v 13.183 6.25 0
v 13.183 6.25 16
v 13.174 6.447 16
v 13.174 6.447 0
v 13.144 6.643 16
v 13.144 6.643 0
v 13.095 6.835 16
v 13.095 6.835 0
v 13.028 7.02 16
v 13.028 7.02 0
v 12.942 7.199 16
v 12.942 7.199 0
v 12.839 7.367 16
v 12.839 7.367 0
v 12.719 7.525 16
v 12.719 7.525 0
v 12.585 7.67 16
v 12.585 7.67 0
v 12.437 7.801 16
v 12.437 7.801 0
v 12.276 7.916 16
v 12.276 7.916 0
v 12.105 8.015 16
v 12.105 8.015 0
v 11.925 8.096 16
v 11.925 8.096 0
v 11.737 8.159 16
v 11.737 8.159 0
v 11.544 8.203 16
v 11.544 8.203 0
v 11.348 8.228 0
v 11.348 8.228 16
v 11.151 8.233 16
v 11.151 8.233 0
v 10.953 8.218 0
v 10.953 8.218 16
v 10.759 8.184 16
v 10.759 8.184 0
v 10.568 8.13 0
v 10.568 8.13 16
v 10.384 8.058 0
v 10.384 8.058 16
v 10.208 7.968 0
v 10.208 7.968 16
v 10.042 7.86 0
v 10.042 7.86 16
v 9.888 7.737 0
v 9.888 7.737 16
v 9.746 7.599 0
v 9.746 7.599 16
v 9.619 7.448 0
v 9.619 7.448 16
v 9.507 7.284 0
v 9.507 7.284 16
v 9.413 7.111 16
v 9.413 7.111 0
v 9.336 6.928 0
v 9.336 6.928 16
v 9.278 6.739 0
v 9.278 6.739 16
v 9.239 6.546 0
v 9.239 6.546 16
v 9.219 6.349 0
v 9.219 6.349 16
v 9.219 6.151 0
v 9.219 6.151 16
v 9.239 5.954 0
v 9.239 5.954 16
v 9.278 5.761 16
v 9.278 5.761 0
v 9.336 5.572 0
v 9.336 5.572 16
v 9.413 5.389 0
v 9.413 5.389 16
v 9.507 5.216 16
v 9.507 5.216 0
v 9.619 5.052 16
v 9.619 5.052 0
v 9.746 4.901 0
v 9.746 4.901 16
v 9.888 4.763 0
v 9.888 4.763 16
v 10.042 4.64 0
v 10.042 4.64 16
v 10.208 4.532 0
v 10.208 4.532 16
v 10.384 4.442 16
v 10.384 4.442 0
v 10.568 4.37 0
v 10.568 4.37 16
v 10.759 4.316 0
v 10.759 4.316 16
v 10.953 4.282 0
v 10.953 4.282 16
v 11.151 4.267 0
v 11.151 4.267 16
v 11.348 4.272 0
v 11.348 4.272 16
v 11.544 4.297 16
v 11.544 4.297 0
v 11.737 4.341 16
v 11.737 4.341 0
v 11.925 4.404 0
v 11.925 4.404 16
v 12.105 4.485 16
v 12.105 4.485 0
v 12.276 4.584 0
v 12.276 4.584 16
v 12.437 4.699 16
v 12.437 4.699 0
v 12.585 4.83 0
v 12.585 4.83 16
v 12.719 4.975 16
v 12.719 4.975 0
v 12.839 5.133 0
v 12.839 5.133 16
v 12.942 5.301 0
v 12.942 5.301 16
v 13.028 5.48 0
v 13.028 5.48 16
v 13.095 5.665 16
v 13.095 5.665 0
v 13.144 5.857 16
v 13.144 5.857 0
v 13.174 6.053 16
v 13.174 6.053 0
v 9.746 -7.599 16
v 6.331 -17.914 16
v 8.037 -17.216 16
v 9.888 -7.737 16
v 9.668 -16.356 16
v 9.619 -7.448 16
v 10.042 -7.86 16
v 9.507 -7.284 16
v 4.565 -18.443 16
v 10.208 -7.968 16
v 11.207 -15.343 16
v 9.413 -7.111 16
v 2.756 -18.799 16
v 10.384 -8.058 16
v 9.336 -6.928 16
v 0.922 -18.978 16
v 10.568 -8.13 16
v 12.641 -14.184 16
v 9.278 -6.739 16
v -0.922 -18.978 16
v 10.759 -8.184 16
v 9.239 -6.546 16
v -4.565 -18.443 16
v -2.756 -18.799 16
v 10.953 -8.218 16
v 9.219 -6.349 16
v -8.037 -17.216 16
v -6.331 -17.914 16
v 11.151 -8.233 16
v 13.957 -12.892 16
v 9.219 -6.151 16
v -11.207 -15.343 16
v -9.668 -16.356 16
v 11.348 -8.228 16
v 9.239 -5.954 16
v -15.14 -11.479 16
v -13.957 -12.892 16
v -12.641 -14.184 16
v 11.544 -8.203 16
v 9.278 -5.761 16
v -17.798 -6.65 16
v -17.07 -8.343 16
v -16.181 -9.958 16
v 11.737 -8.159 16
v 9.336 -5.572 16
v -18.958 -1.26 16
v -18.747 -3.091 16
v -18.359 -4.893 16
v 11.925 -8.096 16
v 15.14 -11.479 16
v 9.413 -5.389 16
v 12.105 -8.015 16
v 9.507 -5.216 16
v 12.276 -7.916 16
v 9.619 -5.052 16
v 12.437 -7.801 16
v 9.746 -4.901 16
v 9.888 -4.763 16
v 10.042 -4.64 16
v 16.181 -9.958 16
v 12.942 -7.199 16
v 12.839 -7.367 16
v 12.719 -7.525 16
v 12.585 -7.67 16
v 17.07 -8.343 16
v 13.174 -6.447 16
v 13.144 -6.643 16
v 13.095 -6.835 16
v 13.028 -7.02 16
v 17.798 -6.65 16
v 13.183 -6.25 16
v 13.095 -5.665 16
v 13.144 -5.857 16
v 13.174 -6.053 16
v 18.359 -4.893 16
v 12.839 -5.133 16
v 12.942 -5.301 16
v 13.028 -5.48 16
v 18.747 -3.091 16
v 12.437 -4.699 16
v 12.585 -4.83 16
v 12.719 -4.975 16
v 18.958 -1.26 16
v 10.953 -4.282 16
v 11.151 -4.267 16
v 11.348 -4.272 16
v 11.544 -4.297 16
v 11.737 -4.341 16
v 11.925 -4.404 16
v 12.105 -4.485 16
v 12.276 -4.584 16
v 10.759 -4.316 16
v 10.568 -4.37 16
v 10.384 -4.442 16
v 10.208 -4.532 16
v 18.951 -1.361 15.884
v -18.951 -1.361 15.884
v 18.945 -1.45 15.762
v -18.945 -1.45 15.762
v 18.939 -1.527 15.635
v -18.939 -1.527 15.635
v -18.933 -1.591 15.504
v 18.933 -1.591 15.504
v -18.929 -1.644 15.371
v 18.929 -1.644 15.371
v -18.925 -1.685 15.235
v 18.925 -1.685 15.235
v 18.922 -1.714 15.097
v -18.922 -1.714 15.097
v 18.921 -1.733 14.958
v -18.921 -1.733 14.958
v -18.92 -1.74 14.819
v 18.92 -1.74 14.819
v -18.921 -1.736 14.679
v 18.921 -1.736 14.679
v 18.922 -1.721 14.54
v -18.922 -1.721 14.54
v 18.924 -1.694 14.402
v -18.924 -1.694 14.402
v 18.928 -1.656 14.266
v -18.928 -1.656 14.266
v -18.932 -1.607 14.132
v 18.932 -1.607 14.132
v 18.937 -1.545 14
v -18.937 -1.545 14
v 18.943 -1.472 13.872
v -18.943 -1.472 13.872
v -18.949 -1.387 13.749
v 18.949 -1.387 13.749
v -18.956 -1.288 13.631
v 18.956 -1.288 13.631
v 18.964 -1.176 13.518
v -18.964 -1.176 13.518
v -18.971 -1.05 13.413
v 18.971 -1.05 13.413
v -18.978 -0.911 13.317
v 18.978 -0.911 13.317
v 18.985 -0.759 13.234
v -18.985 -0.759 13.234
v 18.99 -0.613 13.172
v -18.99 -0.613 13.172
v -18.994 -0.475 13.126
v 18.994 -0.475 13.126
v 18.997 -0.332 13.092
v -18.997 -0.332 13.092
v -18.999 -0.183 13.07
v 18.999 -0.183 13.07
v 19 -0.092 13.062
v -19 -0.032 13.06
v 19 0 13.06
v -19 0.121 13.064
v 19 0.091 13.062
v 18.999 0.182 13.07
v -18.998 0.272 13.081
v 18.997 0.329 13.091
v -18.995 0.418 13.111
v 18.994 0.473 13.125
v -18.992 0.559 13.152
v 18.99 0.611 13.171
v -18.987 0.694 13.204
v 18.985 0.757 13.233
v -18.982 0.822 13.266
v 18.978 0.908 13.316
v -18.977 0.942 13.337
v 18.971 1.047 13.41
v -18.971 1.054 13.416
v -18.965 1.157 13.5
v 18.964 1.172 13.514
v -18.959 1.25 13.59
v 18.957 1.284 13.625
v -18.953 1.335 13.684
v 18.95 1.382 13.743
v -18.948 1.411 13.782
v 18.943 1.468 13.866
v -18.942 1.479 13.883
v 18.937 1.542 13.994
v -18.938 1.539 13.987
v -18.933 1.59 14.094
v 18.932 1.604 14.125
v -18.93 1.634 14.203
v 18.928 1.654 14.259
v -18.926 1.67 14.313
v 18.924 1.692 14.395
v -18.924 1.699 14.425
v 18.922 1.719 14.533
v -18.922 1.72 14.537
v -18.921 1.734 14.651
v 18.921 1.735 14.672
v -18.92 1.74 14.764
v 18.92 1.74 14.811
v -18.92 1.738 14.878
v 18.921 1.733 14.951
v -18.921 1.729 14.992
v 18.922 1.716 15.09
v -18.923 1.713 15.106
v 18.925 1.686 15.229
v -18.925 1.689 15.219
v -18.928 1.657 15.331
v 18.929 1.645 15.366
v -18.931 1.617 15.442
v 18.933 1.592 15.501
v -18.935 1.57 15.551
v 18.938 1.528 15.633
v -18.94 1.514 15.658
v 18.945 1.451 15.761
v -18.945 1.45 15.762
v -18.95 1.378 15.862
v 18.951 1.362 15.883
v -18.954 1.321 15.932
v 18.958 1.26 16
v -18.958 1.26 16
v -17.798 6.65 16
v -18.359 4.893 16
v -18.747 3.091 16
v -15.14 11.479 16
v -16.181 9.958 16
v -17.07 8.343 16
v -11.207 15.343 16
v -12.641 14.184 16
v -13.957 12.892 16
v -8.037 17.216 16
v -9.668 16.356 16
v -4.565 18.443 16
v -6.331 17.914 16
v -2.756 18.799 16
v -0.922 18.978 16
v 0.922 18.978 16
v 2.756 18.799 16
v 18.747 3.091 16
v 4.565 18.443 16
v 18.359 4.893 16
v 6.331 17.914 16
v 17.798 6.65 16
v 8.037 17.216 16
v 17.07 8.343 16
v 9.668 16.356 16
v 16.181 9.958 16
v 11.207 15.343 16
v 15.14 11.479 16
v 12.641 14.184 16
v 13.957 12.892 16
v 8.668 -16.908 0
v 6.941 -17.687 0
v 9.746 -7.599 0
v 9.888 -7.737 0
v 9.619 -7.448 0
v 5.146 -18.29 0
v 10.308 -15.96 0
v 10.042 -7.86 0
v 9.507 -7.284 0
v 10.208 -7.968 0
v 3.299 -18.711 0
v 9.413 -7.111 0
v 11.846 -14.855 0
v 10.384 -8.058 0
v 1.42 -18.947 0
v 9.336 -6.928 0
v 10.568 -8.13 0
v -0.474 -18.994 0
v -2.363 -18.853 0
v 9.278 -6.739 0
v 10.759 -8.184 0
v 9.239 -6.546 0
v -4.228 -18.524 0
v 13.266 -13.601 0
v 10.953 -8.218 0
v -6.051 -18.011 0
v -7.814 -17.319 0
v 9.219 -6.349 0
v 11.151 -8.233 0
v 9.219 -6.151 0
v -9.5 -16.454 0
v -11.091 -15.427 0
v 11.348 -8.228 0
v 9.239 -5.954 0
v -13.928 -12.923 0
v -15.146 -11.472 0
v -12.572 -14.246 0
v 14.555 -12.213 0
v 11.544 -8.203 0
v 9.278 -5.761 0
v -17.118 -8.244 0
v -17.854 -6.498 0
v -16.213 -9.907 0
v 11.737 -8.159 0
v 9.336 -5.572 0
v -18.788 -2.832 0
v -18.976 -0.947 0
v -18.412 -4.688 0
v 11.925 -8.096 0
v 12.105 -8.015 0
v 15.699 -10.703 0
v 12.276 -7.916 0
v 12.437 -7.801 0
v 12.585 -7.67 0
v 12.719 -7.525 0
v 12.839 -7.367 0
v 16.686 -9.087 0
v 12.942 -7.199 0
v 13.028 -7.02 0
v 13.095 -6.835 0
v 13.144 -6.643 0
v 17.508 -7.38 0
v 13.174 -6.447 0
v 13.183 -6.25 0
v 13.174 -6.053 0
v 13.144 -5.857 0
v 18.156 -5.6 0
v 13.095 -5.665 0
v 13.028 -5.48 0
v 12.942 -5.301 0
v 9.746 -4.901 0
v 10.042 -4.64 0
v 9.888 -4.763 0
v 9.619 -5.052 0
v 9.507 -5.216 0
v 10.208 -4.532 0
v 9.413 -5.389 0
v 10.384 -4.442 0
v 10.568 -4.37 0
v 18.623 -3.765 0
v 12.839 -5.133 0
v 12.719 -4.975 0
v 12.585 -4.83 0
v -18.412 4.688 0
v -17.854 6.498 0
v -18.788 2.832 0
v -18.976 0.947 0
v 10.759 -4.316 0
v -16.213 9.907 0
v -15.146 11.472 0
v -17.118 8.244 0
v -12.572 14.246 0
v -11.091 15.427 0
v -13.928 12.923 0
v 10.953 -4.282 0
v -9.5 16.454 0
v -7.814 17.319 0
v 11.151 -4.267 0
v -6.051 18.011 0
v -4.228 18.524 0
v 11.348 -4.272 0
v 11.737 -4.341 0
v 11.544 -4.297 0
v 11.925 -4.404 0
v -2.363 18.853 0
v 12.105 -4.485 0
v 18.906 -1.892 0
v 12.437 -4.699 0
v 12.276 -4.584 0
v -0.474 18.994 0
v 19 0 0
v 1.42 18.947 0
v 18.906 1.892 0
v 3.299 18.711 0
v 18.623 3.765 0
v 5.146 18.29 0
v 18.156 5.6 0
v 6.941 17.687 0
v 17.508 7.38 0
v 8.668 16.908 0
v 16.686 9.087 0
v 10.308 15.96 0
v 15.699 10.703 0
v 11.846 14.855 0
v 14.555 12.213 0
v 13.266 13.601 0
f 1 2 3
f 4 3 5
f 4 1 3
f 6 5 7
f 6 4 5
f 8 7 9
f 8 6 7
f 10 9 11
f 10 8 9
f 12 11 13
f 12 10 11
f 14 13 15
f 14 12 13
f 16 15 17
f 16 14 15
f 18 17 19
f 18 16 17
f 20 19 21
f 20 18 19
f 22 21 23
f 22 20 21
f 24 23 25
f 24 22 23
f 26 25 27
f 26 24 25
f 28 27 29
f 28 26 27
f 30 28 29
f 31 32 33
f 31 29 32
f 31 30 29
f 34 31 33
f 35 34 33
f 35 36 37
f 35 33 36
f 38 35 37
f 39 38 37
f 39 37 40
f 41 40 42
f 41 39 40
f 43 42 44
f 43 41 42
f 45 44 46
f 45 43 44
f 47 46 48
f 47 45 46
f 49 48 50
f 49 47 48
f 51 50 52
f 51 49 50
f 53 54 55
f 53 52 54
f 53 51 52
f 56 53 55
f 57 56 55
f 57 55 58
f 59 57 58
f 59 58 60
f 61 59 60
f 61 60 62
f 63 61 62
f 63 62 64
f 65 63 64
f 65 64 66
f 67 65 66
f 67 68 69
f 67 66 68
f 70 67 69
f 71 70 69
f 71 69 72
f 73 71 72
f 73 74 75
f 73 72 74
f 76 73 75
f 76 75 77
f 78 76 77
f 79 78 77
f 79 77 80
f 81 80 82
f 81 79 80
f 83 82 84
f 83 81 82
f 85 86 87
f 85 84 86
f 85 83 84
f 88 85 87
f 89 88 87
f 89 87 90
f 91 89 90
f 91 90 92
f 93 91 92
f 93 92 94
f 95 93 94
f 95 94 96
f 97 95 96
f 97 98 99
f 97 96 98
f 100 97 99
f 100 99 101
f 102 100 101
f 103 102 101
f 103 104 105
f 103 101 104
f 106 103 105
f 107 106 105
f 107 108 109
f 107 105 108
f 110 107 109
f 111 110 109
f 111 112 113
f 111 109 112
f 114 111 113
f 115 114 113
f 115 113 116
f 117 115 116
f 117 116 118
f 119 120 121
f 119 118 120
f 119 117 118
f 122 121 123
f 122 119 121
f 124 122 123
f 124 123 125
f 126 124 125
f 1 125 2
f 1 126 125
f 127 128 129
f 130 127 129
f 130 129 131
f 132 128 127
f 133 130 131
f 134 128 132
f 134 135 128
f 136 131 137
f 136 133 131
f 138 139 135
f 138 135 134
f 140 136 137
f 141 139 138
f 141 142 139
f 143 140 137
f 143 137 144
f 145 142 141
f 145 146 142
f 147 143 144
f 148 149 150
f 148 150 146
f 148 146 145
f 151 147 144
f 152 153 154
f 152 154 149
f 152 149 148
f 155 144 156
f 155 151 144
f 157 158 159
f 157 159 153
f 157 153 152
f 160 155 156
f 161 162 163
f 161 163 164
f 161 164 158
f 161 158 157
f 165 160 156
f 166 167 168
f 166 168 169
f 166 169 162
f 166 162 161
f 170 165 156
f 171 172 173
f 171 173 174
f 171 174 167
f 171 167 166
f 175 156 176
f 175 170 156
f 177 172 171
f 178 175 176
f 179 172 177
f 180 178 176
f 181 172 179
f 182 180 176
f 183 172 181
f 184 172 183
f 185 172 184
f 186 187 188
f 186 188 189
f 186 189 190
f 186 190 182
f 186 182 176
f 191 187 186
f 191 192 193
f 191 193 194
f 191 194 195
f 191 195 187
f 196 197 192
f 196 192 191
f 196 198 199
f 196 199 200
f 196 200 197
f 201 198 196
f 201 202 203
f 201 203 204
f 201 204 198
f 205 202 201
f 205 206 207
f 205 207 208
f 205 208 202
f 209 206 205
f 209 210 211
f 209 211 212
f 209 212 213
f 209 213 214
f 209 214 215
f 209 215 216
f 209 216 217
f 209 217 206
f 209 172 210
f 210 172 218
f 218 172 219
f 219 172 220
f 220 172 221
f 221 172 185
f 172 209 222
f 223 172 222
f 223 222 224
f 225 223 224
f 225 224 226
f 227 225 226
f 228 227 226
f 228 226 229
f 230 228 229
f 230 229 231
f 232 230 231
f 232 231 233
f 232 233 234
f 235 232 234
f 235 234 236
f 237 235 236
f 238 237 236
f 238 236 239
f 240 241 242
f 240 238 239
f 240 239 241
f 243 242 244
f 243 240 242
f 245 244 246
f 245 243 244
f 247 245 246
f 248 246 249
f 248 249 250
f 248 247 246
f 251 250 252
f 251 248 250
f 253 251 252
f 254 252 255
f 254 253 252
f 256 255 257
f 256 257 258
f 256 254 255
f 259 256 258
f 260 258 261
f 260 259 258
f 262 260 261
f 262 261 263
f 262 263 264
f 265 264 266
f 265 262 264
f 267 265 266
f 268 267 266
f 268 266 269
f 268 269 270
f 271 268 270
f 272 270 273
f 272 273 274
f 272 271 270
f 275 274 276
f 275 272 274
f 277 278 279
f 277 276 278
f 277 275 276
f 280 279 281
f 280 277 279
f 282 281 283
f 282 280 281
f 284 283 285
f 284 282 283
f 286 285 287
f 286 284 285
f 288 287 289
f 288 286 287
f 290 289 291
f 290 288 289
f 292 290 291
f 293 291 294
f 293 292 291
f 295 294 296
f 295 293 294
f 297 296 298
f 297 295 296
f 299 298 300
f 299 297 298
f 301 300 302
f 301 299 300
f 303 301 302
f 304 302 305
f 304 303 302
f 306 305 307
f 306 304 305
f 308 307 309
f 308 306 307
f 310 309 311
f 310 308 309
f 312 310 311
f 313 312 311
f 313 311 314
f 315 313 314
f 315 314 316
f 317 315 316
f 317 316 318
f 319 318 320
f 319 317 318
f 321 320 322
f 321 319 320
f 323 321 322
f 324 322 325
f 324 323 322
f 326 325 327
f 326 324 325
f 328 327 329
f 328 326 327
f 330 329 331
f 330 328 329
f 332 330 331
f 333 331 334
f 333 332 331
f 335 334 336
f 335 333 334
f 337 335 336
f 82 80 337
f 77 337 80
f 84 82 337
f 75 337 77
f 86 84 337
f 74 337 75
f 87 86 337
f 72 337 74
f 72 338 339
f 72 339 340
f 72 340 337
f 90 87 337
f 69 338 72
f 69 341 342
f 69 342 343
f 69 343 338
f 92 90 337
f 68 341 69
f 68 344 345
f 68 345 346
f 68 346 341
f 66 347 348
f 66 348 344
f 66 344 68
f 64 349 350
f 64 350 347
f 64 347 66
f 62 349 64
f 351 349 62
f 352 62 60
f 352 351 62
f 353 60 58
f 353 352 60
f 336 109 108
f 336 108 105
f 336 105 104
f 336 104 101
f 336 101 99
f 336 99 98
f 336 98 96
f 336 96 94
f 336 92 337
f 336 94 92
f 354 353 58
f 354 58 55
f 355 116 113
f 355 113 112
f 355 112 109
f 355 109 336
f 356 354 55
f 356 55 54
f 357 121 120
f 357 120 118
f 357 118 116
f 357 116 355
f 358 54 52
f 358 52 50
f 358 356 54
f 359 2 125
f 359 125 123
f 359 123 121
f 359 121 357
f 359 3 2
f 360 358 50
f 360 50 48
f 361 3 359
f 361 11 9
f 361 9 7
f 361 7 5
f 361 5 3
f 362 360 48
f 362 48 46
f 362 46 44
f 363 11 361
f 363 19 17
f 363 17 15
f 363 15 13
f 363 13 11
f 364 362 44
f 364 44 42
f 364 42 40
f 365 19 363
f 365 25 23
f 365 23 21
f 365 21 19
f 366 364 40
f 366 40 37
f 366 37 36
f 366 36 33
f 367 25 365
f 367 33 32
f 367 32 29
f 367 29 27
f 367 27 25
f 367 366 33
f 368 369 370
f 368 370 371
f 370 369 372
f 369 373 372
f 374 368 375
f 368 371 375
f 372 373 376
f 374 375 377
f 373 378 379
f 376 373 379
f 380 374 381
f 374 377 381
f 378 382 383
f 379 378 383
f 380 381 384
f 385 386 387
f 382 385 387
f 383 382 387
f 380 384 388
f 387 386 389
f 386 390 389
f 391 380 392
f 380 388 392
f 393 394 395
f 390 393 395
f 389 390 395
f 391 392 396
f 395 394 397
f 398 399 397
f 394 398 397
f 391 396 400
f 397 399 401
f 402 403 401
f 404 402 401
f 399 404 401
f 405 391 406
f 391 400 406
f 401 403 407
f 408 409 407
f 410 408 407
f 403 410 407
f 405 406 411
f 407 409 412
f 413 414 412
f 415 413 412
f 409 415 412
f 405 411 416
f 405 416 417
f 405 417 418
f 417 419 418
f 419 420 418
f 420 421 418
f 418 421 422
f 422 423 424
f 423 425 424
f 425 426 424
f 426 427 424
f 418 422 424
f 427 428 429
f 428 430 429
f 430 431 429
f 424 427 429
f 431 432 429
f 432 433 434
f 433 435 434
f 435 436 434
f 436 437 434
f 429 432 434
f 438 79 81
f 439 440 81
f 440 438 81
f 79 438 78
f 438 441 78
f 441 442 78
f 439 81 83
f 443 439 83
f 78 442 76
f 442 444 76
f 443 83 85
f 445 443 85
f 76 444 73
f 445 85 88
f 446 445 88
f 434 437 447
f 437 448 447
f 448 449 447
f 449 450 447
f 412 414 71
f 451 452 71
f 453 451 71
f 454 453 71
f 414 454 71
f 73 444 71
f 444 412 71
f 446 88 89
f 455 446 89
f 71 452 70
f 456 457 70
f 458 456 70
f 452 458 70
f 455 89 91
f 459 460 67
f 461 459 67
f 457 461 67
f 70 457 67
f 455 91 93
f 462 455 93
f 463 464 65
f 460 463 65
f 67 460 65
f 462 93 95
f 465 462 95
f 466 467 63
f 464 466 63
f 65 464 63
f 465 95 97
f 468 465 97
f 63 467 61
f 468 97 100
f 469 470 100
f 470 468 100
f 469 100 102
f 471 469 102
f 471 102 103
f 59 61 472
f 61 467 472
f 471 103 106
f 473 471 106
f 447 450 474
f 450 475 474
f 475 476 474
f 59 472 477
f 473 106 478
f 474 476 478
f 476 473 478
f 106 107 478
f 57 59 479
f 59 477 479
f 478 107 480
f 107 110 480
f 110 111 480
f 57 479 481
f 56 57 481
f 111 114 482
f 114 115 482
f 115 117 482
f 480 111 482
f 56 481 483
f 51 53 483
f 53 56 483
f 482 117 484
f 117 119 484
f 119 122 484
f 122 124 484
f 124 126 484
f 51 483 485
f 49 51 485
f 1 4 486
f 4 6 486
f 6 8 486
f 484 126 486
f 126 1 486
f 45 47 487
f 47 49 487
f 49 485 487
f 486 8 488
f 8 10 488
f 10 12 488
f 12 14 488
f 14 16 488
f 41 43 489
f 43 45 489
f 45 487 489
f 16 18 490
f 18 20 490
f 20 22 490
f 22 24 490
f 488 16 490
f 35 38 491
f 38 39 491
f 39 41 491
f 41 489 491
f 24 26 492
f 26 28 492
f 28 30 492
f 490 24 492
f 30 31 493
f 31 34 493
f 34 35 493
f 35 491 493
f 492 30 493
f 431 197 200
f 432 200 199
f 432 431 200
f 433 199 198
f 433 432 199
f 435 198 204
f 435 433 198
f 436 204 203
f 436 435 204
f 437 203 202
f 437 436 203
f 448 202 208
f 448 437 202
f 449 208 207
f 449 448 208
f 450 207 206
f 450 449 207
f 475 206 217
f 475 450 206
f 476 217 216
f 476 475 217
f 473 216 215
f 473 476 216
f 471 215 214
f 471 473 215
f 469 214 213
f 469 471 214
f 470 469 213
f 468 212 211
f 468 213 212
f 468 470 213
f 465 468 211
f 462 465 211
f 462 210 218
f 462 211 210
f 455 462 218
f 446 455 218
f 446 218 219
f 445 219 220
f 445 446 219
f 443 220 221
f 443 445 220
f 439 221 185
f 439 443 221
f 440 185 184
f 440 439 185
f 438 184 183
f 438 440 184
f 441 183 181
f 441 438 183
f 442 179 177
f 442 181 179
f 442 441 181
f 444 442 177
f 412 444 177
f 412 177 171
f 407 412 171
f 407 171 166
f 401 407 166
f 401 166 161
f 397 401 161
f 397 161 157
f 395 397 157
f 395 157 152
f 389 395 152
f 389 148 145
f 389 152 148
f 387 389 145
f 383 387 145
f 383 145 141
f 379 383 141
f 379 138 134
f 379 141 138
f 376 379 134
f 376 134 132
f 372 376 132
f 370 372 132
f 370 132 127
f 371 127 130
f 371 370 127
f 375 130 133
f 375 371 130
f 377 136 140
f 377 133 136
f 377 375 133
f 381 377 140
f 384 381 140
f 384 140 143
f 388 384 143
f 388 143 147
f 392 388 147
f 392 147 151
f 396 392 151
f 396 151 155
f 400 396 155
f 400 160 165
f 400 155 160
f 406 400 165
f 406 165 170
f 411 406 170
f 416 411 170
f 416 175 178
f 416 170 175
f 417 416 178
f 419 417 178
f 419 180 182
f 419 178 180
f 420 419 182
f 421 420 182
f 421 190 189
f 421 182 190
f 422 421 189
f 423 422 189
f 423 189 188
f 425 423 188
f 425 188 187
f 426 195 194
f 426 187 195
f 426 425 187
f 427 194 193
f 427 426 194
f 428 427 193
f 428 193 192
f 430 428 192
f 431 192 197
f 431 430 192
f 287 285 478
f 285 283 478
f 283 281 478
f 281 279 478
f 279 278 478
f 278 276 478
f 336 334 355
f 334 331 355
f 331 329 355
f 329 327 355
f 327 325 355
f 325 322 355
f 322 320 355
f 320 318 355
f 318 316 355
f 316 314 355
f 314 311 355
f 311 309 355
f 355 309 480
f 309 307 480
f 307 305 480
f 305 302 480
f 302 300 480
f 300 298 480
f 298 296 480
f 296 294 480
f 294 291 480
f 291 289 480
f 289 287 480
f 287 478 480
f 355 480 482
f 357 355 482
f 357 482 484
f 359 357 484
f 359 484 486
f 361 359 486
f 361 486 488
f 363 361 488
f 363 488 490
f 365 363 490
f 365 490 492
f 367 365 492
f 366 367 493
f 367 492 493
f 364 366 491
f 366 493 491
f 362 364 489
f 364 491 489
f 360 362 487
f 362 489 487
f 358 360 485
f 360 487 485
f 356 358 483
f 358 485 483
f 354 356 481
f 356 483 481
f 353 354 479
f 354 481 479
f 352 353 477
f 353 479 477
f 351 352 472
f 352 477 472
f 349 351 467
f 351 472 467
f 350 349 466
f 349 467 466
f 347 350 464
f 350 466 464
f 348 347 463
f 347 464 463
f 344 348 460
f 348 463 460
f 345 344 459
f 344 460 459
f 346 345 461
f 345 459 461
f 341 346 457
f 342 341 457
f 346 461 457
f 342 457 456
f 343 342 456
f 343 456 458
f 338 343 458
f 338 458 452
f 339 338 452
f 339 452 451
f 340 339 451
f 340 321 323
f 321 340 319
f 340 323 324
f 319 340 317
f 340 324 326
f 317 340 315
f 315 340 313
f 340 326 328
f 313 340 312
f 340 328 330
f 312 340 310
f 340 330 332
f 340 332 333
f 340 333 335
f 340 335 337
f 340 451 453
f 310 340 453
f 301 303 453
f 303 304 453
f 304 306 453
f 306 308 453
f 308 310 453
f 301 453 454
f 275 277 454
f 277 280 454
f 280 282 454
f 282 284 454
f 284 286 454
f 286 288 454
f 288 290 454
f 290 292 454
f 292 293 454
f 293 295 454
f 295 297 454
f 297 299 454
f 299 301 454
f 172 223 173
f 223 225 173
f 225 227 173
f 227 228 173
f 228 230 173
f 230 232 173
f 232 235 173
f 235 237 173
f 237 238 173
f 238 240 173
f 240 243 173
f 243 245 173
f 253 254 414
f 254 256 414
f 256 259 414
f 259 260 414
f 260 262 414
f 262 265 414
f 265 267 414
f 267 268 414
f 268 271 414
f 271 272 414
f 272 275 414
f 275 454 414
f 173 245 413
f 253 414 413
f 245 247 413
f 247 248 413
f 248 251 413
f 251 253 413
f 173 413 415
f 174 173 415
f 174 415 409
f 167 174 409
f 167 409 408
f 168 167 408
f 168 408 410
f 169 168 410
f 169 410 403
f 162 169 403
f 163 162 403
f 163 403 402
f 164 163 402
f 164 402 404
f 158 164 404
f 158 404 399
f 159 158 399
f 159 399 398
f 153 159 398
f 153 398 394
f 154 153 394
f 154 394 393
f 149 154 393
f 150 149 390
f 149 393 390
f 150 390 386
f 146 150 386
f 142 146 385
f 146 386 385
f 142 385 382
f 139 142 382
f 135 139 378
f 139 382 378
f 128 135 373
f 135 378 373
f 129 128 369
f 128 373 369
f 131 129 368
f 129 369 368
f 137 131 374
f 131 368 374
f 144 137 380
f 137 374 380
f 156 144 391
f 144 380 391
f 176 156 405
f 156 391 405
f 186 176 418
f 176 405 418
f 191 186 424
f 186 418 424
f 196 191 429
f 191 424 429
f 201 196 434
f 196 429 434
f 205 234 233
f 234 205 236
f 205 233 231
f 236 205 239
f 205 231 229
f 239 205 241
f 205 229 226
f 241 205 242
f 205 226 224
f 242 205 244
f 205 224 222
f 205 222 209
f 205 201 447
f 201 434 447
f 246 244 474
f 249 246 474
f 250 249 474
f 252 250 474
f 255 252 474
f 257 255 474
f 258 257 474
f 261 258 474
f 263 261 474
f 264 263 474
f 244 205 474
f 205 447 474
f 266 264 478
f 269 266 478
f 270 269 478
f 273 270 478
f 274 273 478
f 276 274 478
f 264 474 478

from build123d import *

# Parameters (mm, degrees)
F0_R          = 19
F1_DEPTH      = 16
F2_R          = 1.74
F3_DEPTH      = 19.001
F3_DEPTH_BACK = 19.001
F4_R          = 1.9835
F5_DEPTH      = 16.0010001


with BuildPart() as f1:
    # F0 (on Top) → F1 (new body)
    with BuildSketch(Plane.XY):
        Circle(F0_R)
    extrude(amount=F1_DEPTH)

    # F2 (on Right) → F3 (cut, two sides)
    with BuildSketch(Plane.YZ) as f3_sk:
        with Locations((0, 14.8)):
            Circle(F2_R)
    extrude(amount=-F3_DEPTH, mode=Mode.SUBTRACT)
    extrude(f3_sk.sketch, amount=F3_DEPTH_BACK, mode=Mode.SUBTRACT)

    # F4 (on Top) → F5 (cut, through all)
    with BuildSketch(Plane.XY):
        with Locations((11.2, -6.25)):
            Circle(F4_R)
        with Locations((11.2, 6.25)):
            Circle(F4_R)
    extrude(amount=F5_DEPTH, mode=Mode.SUBTRACT)


solid = f1.part
